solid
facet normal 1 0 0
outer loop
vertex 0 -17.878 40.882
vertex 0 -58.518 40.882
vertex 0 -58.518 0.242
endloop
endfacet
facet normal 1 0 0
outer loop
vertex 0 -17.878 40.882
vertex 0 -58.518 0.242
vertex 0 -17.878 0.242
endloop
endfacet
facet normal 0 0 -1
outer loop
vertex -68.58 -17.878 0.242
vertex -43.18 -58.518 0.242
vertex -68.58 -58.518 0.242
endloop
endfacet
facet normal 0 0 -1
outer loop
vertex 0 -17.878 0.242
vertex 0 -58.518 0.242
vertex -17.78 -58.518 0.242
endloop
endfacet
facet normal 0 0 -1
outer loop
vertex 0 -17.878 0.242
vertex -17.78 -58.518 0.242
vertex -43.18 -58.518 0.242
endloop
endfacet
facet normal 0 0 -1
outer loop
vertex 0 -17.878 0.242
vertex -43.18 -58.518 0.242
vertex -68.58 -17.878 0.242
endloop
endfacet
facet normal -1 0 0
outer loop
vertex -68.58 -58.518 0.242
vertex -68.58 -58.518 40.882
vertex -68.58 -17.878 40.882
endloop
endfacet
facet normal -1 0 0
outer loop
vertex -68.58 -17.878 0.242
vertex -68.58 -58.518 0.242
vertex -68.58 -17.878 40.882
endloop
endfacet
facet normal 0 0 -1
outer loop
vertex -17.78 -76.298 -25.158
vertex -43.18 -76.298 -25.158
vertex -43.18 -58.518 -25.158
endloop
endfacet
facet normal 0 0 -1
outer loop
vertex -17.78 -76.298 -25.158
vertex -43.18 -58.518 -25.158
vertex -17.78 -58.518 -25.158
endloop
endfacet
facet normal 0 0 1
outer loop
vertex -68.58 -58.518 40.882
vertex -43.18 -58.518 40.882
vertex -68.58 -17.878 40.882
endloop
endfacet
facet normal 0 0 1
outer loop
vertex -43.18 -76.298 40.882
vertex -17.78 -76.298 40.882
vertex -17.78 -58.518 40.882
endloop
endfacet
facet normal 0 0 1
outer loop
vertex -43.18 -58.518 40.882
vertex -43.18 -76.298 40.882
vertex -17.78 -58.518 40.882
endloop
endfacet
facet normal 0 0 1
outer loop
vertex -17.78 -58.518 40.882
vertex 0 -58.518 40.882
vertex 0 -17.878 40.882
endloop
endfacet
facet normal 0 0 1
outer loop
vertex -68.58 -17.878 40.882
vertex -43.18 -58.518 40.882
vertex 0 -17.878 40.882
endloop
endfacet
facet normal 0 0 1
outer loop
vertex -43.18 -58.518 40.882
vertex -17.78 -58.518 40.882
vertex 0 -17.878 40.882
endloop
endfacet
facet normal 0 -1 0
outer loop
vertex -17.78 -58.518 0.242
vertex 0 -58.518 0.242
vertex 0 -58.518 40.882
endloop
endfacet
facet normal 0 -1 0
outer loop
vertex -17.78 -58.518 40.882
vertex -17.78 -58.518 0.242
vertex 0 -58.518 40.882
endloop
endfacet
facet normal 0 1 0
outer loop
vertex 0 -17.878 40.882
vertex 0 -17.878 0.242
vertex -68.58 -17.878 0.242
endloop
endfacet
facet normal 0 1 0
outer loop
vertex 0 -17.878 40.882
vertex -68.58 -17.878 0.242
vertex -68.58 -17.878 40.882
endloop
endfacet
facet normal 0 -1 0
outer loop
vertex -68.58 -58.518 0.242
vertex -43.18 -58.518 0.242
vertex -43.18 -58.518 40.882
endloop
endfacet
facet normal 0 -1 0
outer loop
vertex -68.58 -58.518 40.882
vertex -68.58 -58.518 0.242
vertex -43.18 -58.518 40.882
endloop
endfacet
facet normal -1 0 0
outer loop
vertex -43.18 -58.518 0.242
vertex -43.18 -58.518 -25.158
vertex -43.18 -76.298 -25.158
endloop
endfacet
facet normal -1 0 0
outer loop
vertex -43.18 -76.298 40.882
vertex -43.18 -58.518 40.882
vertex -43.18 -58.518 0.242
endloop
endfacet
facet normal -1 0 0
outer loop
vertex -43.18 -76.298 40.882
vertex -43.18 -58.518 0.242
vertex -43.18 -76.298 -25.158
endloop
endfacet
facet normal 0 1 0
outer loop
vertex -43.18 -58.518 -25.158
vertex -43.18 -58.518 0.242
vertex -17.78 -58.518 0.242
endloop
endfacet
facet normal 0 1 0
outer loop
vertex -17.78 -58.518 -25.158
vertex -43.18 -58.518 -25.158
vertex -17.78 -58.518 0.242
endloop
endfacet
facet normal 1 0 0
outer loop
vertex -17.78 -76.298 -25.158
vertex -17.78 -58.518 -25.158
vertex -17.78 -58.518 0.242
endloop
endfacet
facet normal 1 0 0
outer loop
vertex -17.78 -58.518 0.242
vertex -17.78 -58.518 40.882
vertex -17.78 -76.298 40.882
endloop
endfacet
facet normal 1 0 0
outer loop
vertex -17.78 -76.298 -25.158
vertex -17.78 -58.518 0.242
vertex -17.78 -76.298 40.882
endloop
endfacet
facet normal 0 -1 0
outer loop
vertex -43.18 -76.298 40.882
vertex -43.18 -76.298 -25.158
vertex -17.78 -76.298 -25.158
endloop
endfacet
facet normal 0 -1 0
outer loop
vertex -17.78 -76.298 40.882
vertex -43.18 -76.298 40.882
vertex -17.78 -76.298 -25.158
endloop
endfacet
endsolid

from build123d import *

# Parameters (mm, degrees)
F0_W     = 40.64
F0_H     = 40.64
F1_DEPTH = 68.58
F2_W     = 25.4
F2_H     = 40.64
F3_DEPTH = 17.78
F4_W     = 25.4
F4_H     = 17.78
F5_DEPTH = 25.4


with BuildPart() as f1:
    # F0 (on Right) → F1 (new body)
    with BuildSketch(Plane.YZ):
        with Locations((-38.1975453347, 20.5620517739)):
            Rectangle(F0_W, F0_H)
    extrude(amount=-F1_DEPTH)

    # F2 (on face) → F3 (join)
    with BuildSketch(Plane.XZ.offset(58.5175453347)):
        with Locations((-30.48, 20.5620517739)):
            Rectangle(F2_W, F2_H)
    extrude(amount=F3_DEPTH)

    # F4 (on face) → F5 (join)
    with BuildSketch(Plane(origin=(0, 0, 0.2420517739), x_dir=(1, 0, 0), z_dir=(0, 0, -1))):
        with Locations((-30.48, 67.4075453347)):
            Rectangle(F4_W, F4_H)
    extrude(amount=F5_DEPTH)


solid = f1.part
